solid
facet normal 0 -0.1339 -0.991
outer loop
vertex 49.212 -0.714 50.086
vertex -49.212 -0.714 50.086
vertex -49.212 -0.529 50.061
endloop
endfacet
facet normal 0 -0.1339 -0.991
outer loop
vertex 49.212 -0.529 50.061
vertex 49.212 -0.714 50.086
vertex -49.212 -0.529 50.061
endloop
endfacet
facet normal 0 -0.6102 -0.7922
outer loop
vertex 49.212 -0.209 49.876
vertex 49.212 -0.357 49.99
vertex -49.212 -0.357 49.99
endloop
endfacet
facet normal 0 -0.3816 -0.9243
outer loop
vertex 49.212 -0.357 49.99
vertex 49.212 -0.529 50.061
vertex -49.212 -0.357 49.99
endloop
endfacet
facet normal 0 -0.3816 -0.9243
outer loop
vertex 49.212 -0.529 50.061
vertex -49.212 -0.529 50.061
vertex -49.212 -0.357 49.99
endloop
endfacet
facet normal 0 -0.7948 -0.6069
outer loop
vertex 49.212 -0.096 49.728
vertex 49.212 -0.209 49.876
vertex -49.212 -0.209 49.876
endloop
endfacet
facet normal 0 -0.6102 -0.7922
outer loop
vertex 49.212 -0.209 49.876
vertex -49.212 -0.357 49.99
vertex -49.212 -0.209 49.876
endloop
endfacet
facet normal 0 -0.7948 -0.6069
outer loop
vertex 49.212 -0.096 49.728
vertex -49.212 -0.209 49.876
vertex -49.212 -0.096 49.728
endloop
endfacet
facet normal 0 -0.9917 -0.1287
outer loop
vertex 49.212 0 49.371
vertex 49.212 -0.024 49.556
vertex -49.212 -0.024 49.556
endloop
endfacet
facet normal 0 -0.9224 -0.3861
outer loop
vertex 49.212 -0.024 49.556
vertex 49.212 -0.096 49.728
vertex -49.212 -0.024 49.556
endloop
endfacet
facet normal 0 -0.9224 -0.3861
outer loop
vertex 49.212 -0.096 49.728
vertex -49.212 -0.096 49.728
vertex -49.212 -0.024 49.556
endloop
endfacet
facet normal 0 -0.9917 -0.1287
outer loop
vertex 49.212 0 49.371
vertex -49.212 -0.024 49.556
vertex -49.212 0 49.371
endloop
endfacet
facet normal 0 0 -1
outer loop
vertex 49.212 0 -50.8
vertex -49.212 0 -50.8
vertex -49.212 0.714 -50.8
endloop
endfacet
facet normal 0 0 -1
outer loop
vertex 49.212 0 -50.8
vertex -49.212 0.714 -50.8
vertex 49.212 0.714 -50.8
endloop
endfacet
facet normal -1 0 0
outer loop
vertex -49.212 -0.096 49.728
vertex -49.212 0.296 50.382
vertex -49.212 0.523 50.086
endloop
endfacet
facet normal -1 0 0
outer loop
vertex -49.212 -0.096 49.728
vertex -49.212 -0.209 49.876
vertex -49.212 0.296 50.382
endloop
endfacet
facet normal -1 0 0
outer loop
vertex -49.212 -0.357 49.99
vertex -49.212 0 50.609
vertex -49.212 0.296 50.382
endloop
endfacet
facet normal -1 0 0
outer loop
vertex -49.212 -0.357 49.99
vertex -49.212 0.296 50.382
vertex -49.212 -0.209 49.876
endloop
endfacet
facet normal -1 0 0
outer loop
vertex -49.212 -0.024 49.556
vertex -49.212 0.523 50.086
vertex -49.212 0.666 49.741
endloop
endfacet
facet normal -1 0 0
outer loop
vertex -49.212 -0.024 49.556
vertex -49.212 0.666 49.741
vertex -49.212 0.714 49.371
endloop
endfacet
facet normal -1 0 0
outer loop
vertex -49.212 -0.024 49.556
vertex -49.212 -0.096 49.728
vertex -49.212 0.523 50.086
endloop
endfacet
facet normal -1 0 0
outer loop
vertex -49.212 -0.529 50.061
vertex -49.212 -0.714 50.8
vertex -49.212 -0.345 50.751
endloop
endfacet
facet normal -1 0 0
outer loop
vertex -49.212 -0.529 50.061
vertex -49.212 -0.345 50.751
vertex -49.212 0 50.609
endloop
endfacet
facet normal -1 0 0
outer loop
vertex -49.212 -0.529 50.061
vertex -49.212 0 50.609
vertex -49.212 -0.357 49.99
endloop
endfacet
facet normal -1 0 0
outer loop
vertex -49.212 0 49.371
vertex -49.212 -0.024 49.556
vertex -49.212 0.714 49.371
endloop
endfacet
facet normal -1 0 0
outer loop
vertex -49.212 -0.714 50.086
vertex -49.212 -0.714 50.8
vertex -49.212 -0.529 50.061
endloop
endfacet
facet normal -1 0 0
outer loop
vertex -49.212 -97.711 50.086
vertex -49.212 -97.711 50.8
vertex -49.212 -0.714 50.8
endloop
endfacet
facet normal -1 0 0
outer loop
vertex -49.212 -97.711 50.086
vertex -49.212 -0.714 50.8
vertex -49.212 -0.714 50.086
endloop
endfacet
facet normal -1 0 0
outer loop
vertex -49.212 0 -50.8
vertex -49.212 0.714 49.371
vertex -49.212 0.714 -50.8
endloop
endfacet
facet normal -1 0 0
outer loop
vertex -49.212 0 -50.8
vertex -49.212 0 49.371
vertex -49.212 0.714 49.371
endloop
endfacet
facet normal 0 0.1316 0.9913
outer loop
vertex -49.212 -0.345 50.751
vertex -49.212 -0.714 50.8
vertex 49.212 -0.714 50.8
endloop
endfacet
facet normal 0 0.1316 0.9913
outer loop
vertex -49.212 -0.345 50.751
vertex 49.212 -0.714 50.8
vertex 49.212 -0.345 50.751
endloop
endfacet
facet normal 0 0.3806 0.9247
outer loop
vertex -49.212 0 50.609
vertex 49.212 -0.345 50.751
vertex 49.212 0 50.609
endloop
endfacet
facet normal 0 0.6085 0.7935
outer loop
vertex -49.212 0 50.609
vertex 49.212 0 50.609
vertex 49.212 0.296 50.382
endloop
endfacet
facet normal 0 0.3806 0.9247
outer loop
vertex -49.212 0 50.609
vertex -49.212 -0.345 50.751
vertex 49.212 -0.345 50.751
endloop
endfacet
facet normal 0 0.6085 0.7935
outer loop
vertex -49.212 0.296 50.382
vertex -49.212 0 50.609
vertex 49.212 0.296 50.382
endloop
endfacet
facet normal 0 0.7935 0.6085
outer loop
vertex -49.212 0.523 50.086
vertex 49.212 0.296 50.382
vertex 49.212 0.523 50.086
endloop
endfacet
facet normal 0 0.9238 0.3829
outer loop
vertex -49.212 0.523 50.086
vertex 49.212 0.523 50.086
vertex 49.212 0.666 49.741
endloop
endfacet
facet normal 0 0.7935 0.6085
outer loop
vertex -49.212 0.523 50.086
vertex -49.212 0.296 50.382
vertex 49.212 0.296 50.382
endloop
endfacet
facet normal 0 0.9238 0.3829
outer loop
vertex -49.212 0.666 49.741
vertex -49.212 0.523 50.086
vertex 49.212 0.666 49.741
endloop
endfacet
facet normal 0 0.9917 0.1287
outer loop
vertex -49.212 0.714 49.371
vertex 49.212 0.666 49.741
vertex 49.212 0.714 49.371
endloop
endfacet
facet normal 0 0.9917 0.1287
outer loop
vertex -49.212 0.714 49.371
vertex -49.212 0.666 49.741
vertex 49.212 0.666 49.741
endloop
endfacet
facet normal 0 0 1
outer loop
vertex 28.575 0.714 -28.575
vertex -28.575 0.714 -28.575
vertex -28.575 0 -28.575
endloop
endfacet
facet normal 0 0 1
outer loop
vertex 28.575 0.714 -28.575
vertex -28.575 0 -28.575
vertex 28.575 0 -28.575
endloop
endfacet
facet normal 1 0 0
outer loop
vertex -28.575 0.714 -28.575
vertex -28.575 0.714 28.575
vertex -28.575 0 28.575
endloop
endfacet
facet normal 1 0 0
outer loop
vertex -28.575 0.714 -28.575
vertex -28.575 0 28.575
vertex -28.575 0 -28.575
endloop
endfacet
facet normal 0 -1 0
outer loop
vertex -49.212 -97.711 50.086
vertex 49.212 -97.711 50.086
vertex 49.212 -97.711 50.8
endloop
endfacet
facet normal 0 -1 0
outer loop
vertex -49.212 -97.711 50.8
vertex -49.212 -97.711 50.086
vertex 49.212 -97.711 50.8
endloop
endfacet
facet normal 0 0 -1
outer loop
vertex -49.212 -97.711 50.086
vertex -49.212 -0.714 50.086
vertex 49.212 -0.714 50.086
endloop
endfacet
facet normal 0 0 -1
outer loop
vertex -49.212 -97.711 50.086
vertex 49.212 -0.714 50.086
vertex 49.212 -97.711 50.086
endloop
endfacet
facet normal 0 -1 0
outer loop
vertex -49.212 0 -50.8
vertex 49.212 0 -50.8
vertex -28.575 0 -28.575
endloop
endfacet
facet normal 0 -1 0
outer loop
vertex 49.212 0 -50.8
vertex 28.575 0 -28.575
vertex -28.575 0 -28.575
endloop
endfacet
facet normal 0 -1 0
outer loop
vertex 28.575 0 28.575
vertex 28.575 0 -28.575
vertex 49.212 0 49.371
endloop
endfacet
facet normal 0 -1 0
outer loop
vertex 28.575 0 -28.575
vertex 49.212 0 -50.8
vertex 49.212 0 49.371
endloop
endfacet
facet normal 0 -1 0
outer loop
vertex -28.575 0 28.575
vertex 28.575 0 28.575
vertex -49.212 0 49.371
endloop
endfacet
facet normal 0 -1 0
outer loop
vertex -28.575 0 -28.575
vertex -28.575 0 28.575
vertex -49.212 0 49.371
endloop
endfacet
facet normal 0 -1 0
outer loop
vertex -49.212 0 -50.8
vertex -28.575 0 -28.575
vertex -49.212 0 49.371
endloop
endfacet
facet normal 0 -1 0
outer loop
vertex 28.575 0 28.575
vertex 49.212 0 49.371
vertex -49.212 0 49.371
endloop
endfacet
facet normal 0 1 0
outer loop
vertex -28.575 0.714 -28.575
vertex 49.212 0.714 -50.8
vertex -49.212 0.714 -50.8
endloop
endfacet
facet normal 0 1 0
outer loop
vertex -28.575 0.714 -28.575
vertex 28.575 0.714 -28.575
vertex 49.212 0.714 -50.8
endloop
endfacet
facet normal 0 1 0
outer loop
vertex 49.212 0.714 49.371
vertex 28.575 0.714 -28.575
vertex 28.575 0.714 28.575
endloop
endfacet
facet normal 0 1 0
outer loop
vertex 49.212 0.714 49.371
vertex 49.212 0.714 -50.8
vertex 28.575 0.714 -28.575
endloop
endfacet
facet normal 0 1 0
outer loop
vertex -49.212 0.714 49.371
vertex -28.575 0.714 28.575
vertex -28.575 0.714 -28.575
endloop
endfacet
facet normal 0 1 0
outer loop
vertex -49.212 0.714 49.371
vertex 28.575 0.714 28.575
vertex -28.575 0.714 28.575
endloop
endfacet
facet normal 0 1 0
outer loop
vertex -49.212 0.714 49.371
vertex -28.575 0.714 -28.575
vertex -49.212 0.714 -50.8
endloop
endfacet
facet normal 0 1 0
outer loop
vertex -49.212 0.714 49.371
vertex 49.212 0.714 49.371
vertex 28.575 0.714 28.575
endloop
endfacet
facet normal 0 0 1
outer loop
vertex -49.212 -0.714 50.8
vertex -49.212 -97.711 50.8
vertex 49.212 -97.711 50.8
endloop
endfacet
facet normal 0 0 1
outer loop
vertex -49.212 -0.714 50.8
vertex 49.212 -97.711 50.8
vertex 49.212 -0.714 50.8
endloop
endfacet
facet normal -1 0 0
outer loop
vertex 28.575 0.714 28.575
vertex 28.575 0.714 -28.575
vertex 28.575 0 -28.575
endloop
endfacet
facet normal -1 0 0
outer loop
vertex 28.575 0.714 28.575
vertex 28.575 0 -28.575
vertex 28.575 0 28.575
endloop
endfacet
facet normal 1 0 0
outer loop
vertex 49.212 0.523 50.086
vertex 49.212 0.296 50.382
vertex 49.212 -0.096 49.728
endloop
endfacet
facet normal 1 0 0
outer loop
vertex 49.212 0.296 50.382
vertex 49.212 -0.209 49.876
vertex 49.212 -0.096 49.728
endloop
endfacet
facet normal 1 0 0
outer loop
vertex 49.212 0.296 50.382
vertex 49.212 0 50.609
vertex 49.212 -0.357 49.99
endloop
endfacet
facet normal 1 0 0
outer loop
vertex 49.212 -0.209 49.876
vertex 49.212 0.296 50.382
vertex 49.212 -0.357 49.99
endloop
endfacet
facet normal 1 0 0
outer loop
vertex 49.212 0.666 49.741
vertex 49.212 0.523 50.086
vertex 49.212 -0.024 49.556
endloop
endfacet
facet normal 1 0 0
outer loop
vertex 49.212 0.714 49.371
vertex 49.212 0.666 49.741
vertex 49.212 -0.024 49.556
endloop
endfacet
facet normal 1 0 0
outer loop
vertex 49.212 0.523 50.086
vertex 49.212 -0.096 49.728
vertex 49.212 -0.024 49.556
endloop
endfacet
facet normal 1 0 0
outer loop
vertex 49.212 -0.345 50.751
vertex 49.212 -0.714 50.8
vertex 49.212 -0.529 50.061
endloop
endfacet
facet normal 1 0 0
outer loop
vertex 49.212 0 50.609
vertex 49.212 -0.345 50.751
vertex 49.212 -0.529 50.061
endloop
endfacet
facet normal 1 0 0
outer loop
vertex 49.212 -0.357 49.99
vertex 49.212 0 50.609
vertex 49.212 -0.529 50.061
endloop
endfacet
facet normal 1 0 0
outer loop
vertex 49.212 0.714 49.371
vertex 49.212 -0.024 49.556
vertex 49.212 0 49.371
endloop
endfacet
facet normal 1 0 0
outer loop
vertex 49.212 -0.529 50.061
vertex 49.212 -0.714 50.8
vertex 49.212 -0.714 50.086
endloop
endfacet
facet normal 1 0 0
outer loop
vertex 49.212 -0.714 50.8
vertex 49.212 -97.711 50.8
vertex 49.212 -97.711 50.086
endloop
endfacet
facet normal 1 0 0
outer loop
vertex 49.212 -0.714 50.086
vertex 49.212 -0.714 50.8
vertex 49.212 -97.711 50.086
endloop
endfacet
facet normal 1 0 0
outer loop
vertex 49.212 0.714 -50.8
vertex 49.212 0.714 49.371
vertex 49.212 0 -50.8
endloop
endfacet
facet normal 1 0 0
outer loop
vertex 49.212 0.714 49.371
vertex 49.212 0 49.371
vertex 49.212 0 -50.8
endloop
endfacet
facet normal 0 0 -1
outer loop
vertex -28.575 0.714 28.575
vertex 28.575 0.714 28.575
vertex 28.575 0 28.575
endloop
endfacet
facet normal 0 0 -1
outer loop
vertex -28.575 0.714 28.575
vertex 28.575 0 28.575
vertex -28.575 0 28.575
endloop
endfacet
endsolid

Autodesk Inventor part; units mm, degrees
ref_plane "YZ Plane" through (0, 0, 0) normal (1, 0, 0) x (0, 1, 0)
ref_plane "XZ Plane" through (0, 0, 0) normal (0, 1, 0) x (-1, 0, 0)
ref_plane "XY Plane" through (0, 0, 0) normal (0, 0, 1) x (1, 0, 0)
sketch "Sketch1" plane through (0, 0, 0) normal (0, 1, 0) x (-1, 0, 0)
  line L0 (-49.2125, 50.8) -> (49.2125, 50.8)
  line L1 (49.2125, 50.8) -> (49.2125, -50.8)
  line L2 (49.2125, -50.8) -> (-49.2125, -50.8)
  line L3 (-49.2125, -50.8) -> (-49.2125, 50.8)
  line L4 (-49.2125, 50.8) -> (49.2125, -50.8) construction
  line L5 (49.2125, 50.8) -> (-49.2125, -50.8) construction
  point P0 (0, 0)
  dimension "d0" = 98.425
  dimension "d1" = 101.6
extrude "Plate1" add sketch "Sketch1" along normal blind 0.7144
sketch "Sketch2" plane through (-49.2125, 0.7144, 50.0856) normal (0, 0, 1) x (1, 0, 0)
  line L0 (98.425, 0) -> (0, 0)
  line L1 (0, 0) -> (0, -98.425)
  line L2 (0, -98.425) -> (98.425, -98.425)
  line L3 (98.425, -98.425) -> (98.425, 0)
edge flange "Flange1" height 98.425 angle 90 thickness 0.7144 bend radius 0.7144 thickness toward (0, 0, 1) relief tear relief width 0.7144 relief depth 0.3572 edges at (0, 0, 50.8) wall of the first edge with corners at (49.2125, 0.7144, 50.0856) (-49.2125, 0.7144, 50.0856) (-49.2125, -97.7106, 50.0856) (49.2125, -97.7106, 50.0856)
bend "Bend1"
corner "Corner1"
sketch "Sketch3" plane through (0, 0.7144, 0) normal (0, 1, 0) x (1, 0, 0)
  line L0 (28.575, -28.575) -> (-28.575, -28.575)
  line L1 (-28.575, -28.575) -> (-28.575, 28.575)
  line L2 (-28.575, 28.575) -> (28.575, 28.575)
  line L3 (28.575, 28.575) -> (28.575, -28.575)
  line L4 (28.575, -28.575) -> (-28.575, 28.575) construction
  line L5 (-28.575, -28.575) -> (28.575, 28.575) construction
  point P0 (0, 0)
  dimension "d13" = 57.15
  dimension "d14" = 57.15
extrude "Extrusion1" cut sketch "Sketch3" against normal blind 0.7144
equation "\"d15\" = Thickness"
equation "\"d2\" = Thickness"
equation "\"d3\" = BendReliefWidth"
equation "\"d4\" = BendReliefDepth"
equation "\"d5\" = MinimumRemnant"
equation "\"d6\" = TransitionRadius"
equation "\"d9\" = BendRadius"
equation "\"d10\" = CornerReliefSize"
equation "\"d11\" = GapSize"
equation "\"d12\" = JacobiRadiusSize"
equation "\"BendRadius\" = Thickness"
equation "\"BendReliefWidth\" = Thickness"
equation "\"BendReliefDepth\" = 0.5 * Thickness"
equation "\"CornerReliefSize\" = 4 * Thickness"
equation "\"MinimumRemnant\" = 2 * Thickness"
equation "\"TransitionRadius\" = BendRadius"
equation "\"JacobiRadiusSize\" = BendRadius"
equation "\"GapSize\" = Thickness"
equation "\"Thickness\" = 0.714375"
